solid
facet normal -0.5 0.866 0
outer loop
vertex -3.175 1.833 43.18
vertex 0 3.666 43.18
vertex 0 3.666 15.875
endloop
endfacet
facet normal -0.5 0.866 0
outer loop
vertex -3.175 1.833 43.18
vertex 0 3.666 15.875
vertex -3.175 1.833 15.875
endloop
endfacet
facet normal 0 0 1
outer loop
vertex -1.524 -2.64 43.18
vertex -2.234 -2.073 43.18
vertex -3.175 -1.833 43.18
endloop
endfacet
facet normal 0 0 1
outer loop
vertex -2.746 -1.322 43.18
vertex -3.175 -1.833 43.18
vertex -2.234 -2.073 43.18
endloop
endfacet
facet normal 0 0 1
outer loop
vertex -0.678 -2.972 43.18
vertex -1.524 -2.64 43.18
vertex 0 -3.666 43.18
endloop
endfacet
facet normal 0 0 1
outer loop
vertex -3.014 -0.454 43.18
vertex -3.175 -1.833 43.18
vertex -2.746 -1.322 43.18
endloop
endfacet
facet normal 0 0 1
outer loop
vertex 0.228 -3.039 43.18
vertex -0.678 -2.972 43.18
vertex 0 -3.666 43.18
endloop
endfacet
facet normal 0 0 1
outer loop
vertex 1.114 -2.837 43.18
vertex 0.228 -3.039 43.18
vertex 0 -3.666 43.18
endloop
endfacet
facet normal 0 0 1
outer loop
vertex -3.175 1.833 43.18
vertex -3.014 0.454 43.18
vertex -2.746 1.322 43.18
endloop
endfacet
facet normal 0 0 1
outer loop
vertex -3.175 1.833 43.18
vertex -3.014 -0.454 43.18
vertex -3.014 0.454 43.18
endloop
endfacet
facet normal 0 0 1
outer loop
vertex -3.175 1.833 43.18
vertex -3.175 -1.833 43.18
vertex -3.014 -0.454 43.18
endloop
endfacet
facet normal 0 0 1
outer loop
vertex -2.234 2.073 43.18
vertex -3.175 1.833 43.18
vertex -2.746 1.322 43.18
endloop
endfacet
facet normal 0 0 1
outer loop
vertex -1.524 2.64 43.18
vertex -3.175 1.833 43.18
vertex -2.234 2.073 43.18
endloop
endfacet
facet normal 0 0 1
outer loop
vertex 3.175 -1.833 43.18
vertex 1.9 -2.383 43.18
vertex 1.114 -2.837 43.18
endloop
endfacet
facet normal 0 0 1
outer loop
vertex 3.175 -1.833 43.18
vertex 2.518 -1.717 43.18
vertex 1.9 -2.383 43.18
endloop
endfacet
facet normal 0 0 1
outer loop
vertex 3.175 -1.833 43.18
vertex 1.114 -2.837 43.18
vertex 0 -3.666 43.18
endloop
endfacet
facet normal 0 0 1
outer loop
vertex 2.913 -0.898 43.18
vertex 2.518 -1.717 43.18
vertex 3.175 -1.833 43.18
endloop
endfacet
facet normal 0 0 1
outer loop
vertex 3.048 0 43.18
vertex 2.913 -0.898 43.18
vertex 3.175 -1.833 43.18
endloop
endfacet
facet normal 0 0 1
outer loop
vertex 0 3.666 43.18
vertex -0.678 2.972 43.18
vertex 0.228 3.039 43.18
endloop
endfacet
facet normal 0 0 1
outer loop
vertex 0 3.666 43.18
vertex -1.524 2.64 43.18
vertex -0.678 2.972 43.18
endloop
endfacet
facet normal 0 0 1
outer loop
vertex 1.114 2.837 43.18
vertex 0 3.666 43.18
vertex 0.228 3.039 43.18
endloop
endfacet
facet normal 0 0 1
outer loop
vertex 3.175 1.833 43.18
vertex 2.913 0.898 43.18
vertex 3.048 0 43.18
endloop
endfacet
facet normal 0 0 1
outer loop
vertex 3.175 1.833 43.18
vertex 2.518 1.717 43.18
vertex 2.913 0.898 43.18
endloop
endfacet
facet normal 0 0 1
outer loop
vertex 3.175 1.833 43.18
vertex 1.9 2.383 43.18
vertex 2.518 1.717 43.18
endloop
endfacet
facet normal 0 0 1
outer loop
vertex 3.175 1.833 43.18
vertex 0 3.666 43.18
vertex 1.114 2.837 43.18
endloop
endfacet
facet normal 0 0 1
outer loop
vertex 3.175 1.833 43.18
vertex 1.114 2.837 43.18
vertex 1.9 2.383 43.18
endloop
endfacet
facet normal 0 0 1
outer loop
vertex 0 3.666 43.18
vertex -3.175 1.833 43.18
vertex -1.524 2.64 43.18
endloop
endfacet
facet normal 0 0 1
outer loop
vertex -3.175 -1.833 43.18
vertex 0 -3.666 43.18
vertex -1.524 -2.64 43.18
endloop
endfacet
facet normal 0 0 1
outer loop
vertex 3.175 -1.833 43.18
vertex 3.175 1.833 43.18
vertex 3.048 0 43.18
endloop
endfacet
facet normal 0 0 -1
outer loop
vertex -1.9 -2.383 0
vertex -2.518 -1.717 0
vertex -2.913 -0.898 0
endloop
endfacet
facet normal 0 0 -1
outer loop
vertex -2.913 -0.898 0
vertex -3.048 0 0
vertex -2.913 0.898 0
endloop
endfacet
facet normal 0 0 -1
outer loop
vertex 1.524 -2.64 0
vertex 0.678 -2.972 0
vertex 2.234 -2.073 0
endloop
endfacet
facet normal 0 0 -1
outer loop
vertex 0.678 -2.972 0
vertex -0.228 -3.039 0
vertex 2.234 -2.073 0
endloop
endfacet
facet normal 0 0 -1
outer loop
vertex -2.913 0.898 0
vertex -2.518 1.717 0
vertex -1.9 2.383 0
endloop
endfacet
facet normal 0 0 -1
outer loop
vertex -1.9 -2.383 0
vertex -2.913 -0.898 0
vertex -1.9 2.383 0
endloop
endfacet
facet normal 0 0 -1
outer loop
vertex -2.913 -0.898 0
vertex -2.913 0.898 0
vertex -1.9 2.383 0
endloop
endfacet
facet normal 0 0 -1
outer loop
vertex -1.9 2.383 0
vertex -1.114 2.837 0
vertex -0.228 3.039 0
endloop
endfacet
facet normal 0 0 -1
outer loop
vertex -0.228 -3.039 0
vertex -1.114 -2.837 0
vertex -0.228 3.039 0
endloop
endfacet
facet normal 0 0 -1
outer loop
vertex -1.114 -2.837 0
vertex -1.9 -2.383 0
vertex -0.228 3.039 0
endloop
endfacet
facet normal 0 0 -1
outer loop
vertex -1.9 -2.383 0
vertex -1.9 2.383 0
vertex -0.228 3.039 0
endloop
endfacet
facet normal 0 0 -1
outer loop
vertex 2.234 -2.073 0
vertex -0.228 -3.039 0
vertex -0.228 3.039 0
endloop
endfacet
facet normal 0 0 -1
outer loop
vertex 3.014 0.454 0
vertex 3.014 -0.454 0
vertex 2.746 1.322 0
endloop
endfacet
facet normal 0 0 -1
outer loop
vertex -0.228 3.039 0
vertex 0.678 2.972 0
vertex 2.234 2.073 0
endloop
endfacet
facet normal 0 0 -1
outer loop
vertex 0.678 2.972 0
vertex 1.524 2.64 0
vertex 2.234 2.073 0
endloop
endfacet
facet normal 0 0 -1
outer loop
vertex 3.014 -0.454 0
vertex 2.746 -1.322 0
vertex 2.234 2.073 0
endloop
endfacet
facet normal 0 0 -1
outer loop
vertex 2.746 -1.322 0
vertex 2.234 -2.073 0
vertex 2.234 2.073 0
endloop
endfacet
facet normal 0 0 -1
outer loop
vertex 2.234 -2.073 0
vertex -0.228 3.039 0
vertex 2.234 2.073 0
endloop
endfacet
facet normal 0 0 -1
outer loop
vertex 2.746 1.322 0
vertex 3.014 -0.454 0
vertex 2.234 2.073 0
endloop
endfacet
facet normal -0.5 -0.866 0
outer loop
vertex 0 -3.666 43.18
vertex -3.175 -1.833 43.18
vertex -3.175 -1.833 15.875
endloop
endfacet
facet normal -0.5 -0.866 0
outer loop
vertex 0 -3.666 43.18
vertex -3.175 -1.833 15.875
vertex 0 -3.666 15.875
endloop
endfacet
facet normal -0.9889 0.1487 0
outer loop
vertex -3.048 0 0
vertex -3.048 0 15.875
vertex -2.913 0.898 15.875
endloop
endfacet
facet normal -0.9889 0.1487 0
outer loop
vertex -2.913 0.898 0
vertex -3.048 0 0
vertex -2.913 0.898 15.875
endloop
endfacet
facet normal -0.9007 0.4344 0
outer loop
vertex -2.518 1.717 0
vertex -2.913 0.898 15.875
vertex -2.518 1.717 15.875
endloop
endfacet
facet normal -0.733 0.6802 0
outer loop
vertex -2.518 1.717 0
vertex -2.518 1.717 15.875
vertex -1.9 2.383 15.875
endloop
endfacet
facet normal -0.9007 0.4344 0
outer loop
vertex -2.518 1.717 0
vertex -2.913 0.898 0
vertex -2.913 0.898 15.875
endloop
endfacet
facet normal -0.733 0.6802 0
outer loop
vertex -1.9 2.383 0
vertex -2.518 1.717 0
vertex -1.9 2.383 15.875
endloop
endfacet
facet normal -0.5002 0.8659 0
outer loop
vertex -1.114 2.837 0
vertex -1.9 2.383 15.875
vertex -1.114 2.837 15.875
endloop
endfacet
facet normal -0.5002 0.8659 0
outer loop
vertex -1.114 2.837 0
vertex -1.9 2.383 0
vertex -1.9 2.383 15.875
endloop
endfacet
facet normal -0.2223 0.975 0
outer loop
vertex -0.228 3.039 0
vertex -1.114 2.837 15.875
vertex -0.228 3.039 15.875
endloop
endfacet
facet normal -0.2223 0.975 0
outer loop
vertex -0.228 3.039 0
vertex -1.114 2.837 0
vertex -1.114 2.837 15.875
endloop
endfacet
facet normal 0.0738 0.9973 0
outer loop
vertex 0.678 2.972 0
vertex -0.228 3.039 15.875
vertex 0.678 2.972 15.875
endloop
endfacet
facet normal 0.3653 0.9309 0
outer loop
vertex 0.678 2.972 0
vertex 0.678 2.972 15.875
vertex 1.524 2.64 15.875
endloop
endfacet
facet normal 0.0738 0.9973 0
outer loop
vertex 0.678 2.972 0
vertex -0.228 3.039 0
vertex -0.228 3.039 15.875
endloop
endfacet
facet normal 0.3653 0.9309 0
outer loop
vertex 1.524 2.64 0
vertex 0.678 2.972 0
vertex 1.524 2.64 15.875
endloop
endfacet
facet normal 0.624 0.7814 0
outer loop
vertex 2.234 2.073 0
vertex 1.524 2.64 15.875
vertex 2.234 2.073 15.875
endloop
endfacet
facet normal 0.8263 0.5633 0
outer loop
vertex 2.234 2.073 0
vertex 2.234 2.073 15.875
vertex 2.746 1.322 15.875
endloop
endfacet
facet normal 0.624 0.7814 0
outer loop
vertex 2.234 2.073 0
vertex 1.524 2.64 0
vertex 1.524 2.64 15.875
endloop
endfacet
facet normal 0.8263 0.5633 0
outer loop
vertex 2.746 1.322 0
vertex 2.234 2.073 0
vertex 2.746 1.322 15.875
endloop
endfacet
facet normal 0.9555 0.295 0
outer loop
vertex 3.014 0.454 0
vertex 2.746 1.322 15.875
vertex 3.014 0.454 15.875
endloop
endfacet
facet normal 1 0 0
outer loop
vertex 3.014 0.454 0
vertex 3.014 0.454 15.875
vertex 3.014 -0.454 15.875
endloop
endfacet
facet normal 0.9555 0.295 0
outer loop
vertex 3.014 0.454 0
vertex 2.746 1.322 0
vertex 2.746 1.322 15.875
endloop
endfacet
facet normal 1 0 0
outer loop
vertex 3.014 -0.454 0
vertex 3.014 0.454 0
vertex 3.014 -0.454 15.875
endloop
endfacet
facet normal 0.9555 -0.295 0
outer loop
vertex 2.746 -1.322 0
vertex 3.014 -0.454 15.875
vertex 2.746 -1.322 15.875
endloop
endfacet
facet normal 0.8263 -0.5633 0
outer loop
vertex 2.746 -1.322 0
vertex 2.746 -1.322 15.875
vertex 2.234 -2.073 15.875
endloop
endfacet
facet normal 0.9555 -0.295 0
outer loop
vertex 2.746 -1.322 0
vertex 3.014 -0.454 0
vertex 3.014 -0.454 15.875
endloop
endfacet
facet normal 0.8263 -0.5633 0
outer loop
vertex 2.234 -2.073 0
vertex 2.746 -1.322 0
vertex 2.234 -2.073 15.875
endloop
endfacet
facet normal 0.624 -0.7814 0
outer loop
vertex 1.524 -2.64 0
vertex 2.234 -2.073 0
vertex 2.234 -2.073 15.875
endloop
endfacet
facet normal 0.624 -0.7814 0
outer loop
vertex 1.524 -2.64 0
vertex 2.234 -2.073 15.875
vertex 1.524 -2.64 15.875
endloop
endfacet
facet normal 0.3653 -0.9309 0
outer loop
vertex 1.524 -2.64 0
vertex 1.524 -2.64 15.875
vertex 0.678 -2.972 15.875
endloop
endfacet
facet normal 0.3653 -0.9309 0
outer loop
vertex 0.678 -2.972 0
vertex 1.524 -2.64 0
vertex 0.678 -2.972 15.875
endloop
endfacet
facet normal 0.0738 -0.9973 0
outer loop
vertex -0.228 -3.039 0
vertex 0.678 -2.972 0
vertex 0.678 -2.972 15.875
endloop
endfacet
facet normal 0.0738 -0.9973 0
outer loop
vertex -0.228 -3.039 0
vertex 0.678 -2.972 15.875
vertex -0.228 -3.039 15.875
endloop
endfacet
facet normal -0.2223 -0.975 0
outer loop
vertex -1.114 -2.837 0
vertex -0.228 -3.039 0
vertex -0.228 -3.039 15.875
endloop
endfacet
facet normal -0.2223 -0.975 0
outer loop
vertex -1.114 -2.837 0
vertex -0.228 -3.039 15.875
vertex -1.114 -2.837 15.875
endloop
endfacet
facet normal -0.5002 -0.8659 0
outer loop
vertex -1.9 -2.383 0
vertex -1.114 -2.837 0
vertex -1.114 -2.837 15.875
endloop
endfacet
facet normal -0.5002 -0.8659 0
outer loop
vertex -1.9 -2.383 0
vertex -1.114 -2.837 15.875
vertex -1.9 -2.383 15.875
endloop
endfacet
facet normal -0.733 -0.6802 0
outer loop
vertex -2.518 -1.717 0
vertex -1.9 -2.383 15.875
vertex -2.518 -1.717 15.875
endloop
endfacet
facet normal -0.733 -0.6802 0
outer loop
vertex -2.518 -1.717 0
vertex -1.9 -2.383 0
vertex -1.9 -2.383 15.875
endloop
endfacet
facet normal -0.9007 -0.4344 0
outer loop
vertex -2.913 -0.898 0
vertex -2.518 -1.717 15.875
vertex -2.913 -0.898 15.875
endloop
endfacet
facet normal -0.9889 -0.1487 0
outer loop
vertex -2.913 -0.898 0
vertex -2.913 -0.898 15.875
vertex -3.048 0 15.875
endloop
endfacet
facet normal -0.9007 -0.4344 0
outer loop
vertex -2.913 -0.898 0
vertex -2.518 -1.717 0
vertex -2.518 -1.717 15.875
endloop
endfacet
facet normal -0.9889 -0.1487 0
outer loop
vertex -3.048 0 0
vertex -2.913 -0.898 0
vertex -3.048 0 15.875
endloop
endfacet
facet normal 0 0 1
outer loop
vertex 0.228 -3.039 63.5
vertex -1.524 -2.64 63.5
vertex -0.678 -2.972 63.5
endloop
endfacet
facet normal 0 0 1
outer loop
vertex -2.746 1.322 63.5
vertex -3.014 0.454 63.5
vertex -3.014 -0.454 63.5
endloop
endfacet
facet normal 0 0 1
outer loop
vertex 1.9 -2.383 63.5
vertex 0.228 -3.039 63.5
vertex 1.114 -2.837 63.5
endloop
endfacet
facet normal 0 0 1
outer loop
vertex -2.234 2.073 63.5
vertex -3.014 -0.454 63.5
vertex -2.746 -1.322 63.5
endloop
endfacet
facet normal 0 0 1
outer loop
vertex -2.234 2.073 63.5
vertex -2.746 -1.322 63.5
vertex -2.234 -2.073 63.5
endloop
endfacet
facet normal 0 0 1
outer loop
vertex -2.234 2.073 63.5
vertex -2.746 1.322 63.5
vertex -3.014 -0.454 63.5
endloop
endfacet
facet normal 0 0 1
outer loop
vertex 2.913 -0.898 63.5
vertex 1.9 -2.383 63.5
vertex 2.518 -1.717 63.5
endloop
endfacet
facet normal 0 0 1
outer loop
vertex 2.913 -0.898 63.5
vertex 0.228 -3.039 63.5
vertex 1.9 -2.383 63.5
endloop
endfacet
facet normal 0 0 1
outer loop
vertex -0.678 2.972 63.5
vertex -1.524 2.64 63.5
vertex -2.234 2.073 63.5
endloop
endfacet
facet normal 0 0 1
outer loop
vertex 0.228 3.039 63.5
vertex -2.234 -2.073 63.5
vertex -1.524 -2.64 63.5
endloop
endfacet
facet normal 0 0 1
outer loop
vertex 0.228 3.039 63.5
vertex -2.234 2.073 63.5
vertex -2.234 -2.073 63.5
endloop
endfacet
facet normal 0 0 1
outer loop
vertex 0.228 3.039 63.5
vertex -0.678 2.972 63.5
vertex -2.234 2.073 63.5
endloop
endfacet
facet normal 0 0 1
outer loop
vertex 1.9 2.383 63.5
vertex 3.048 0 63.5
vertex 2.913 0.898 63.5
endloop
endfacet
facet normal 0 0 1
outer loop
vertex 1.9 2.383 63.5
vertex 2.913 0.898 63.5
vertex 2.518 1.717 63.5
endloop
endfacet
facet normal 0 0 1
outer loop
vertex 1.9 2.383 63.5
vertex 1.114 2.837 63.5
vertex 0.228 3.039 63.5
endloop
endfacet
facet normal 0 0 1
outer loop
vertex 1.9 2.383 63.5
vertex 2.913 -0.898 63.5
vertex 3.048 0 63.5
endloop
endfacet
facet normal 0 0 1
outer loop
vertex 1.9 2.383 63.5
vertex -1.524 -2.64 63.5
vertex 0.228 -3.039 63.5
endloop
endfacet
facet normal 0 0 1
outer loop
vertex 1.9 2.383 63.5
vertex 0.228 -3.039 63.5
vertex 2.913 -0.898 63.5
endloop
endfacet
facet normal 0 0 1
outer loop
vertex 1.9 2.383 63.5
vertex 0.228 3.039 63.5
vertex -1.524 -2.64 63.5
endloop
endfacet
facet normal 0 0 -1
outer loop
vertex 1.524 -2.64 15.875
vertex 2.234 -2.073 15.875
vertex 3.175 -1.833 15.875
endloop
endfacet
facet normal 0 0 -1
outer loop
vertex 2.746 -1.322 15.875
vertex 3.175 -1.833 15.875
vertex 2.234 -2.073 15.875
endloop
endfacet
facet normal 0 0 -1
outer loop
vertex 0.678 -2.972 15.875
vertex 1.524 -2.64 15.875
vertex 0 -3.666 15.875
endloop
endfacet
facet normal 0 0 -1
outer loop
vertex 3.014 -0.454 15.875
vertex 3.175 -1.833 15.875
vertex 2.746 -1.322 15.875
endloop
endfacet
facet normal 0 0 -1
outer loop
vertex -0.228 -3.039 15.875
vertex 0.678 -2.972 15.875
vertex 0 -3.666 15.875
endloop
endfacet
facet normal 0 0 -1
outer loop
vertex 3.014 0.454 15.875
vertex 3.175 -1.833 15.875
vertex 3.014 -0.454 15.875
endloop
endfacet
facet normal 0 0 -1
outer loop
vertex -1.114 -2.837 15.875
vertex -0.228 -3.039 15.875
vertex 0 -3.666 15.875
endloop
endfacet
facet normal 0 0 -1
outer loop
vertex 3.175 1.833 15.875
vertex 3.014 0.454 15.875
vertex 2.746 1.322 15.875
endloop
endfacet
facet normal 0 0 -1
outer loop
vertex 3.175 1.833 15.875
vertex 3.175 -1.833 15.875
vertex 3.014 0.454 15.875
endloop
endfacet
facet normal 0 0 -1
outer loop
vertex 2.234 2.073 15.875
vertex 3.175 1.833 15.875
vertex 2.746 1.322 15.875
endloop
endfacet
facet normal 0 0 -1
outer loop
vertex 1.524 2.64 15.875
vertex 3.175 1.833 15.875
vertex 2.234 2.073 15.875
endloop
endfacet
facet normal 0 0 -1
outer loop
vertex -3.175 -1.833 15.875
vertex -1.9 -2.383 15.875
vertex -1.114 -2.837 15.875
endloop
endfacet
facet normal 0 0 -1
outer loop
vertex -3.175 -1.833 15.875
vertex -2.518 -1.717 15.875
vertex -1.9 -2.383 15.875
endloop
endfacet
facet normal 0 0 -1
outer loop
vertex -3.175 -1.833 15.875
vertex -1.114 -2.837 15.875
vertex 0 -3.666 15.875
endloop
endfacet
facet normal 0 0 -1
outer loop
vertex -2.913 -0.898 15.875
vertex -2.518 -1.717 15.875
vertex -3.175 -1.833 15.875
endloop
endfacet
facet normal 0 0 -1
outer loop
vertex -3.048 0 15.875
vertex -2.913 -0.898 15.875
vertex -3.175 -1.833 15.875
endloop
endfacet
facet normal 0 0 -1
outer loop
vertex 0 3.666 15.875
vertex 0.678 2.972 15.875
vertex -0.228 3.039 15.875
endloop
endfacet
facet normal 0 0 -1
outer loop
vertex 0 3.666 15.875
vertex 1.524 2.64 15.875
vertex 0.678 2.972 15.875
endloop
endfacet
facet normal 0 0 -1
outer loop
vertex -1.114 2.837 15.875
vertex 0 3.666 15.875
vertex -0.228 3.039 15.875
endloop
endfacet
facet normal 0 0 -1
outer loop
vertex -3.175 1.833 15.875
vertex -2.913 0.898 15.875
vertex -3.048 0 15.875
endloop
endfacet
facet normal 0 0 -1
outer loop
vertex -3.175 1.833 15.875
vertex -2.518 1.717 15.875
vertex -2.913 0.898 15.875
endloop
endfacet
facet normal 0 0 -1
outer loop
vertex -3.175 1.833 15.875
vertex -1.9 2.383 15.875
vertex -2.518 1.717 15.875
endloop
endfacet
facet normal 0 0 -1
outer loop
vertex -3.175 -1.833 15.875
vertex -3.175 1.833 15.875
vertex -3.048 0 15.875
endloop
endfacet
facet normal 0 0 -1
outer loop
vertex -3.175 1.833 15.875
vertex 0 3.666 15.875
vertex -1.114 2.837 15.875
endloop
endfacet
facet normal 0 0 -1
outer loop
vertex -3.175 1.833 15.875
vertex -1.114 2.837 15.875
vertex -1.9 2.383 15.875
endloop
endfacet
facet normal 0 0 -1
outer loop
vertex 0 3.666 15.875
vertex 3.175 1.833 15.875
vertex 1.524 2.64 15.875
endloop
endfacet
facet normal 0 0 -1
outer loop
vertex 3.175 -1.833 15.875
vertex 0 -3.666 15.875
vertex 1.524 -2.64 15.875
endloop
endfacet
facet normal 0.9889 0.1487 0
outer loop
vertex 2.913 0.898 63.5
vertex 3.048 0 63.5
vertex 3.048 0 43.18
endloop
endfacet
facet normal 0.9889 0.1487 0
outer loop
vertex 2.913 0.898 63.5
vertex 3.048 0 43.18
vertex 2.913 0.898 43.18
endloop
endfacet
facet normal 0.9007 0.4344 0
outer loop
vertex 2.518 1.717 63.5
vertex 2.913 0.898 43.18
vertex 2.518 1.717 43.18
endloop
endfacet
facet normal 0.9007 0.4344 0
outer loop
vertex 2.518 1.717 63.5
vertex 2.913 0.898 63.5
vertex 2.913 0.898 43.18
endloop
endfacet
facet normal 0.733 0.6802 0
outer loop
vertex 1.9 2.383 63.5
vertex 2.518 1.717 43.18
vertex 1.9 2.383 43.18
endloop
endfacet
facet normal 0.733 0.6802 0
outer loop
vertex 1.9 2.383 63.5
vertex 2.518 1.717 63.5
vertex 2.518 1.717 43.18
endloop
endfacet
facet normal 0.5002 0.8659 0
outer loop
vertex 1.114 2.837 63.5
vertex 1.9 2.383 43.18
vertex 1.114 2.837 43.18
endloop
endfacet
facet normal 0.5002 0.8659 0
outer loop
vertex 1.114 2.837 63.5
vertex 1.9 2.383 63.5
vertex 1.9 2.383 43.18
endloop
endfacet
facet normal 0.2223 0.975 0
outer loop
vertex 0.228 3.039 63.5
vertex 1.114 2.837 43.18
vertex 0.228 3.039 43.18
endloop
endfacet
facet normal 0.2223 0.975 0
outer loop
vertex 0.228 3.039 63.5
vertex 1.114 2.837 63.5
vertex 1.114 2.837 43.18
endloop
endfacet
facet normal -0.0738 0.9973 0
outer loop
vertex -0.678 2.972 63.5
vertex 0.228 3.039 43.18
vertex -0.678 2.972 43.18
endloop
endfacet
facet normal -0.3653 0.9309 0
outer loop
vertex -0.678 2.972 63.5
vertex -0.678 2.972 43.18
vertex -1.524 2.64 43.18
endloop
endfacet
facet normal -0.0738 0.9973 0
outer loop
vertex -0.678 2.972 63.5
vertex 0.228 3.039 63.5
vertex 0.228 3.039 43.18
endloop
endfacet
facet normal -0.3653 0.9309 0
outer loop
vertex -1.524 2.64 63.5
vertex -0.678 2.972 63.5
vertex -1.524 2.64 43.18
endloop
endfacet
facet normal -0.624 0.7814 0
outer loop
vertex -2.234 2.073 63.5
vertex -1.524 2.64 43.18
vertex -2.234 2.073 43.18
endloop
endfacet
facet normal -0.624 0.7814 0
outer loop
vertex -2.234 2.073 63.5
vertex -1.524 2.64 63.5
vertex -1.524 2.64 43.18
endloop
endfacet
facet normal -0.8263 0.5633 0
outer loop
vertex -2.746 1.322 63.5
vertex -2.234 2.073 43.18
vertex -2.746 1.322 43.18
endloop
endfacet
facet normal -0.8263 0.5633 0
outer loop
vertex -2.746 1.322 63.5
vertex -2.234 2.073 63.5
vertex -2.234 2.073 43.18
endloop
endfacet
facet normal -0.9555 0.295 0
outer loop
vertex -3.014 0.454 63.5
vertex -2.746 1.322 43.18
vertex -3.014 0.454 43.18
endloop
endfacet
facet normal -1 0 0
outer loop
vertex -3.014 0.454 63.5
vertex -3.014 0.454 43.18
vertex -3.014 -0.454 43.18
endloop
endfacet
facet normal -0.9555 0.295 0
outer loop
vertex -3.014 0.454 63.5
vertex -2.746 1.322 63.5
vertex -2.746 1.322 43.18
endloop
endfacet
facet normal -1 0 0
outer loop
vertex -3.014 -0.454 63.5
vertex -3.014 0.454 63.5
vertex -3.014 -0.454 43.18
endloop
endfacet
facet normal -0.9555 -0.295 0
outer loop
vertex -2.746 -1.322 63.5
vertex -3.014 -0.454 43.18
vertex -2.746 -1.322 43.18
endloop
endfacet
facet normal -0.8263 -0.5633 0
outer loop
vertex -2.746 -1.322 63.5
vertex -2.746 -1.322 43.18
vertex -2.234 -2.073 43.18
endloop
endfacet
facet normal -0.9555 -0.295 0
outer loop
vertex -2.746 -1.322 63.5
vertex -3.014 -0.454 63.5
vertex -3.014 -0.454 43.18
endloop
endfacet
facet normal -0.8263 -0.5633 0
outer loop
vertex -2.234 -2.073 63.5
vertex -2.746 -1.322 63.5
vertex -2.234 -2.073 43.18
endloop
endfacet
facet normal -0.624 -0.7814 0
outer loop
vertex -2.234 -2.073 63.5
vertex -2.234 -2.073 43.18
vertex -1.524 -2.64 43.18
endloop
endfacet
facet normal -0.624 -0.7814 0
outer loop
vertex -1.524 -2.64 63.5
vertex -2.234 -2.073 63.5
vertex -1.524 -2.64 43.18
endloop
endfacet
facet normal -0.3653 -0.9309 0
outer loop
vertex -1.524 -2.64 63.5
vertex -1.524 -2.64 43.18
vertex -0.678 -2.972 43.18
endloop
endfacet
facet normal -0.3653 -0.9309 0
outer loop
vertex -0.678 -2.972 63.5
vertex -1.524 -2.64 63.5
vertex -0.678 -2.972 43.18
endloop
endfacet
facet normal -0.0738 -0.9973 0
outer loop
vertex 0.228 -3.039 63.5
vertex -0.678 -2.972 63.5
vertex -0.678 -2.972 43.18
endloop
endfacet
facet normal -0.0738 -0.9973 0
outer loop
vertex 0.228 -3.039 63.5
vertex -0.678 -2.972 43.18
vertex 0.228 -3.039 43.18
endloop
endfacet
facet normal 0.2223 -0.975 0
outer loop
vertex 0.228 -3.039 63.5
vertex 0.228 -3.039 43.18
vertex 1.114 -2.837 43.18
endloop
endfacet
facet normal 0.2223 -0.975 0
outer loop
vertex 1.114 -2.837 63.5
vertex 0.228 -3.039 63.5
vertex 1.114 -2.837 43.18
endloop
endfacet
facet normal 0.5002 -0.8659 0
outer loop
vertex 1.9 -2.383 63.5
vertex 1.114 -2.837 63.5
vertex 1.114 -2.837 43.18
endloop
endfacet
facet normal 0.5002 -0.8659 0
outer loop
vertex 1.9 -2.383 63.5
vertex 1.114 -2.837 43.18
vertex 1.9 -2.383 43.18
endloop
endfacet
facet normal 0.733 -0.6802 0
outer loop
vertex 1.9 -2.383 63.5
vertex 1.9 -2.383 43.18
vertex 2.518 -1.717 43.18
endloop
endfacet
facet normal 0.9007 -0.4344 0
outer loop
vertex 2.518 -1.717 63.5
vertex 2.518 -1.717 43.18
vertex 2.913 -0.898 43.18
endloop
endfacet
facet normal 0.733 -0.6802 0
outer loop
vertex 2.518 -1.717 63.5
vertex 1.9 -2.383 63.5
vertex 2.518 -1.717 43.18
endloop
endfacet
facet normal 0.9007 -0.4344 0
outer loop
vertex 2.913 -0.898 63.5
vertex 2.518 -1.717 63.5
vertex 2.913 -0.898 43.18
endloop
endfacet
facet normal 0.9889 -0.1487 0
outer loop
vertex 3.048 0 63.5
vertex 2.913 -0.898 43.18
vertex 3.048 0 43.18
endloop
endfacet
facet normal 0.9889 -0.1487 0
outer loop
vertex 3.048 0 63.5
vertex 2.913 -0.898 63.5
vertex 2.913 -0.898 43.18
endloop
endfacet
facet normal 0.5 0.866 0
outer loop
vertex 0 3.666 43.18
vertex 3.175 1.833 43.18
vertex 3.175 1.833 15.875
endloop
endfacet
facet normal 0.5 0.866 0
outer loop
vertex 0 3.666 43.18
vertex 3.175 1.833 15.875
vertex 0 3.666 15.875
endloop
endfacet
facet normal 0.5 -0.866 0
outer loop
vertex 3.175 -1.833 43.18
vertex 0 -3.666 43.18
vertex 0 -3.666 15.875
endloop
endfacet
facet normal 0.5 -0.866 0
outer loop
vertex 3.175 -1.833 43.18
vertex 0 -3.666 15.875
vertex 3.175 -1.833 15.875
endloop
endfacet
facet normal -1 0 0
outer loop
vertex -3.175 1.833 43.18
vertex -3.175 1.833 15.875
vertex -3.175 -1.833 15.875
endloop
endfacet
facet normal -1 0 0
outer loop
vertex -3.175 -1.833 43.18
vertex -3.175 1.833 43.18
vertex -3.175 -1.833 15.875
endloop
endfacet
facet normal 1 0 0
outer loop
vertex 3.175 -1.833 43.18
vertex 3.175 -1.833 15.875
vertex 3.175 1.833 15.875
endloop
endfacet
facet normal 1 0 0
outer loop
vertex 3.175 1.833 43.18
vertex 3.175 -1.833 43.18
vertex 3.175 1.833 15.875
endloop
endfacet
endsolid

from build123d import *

# Parameters (mm, degrees)
BOSS_EXTRUDE1_DEPTH = 63.5
SKETCH3_OUTSIDE_W   = 21.198
SKETCH3_OUTSIDE_H   = 22.18
SKETCH3_OUTSIDE_R   = 3.048
CUT_EXTRUDE1_DEPTH  = 20.32
SKETCH4_OUTSIDE_W   = 21.198
SKETCH4_OUTSIDE_H   = 22.18
SKETCH4_OUTSIDE_R   = 3.048
CUT_EXTRUDE2_DEPTH  = 15.875


with BuildPart() as part:
    # Sketch2 → Boss-Extrude1 (new body)
    with BuildSketch(Plane.XY):
        Polygon((0, 3.666174209), (-3.175, 1.833087105), (-3.175, -1.833087105), (0, -3.666174209), (3.175, -1.833087105), (3.175, 1.833087105), align=None)
    extrude(amount=BOSS_EXTRUDE1_DEPTH)

    # Sketch3 outside → Cut-Extrude1 (cut)
    with BuildSketch(Plane.XY.offset(63.5)):
        Rectangle(SKETCH3_OUTSIDE_W, SKETCH3_OUTSIDE_H)
        Circle(SKETCH3_OUTSIDE_R, mode=Mode.SUBTRACT)
    extrude(amount=-CUT_EXTRUDE1_DEPTH, mode=Mode.SUBTRACT)

    # Sketch4 outside → Cut-Extrude2 (cut)
    with BuildSketch(Plane(origin=(0, 0, 0), x_dir=(-1, 0, 0), z_dir=(0, 0, -1))):
        Rectangle(SKETCH4_OUTSIDE_W, SKETCH4_OUTSIDE_H)
        Circle(SKETCH4_OUTSIDE_R, mode=Mode.SUBTRACT)
    extrude(amount=-CUT_EXTRUDE2_DEPTH, mode=Mode.SUBTRACT)


solid = part.part
